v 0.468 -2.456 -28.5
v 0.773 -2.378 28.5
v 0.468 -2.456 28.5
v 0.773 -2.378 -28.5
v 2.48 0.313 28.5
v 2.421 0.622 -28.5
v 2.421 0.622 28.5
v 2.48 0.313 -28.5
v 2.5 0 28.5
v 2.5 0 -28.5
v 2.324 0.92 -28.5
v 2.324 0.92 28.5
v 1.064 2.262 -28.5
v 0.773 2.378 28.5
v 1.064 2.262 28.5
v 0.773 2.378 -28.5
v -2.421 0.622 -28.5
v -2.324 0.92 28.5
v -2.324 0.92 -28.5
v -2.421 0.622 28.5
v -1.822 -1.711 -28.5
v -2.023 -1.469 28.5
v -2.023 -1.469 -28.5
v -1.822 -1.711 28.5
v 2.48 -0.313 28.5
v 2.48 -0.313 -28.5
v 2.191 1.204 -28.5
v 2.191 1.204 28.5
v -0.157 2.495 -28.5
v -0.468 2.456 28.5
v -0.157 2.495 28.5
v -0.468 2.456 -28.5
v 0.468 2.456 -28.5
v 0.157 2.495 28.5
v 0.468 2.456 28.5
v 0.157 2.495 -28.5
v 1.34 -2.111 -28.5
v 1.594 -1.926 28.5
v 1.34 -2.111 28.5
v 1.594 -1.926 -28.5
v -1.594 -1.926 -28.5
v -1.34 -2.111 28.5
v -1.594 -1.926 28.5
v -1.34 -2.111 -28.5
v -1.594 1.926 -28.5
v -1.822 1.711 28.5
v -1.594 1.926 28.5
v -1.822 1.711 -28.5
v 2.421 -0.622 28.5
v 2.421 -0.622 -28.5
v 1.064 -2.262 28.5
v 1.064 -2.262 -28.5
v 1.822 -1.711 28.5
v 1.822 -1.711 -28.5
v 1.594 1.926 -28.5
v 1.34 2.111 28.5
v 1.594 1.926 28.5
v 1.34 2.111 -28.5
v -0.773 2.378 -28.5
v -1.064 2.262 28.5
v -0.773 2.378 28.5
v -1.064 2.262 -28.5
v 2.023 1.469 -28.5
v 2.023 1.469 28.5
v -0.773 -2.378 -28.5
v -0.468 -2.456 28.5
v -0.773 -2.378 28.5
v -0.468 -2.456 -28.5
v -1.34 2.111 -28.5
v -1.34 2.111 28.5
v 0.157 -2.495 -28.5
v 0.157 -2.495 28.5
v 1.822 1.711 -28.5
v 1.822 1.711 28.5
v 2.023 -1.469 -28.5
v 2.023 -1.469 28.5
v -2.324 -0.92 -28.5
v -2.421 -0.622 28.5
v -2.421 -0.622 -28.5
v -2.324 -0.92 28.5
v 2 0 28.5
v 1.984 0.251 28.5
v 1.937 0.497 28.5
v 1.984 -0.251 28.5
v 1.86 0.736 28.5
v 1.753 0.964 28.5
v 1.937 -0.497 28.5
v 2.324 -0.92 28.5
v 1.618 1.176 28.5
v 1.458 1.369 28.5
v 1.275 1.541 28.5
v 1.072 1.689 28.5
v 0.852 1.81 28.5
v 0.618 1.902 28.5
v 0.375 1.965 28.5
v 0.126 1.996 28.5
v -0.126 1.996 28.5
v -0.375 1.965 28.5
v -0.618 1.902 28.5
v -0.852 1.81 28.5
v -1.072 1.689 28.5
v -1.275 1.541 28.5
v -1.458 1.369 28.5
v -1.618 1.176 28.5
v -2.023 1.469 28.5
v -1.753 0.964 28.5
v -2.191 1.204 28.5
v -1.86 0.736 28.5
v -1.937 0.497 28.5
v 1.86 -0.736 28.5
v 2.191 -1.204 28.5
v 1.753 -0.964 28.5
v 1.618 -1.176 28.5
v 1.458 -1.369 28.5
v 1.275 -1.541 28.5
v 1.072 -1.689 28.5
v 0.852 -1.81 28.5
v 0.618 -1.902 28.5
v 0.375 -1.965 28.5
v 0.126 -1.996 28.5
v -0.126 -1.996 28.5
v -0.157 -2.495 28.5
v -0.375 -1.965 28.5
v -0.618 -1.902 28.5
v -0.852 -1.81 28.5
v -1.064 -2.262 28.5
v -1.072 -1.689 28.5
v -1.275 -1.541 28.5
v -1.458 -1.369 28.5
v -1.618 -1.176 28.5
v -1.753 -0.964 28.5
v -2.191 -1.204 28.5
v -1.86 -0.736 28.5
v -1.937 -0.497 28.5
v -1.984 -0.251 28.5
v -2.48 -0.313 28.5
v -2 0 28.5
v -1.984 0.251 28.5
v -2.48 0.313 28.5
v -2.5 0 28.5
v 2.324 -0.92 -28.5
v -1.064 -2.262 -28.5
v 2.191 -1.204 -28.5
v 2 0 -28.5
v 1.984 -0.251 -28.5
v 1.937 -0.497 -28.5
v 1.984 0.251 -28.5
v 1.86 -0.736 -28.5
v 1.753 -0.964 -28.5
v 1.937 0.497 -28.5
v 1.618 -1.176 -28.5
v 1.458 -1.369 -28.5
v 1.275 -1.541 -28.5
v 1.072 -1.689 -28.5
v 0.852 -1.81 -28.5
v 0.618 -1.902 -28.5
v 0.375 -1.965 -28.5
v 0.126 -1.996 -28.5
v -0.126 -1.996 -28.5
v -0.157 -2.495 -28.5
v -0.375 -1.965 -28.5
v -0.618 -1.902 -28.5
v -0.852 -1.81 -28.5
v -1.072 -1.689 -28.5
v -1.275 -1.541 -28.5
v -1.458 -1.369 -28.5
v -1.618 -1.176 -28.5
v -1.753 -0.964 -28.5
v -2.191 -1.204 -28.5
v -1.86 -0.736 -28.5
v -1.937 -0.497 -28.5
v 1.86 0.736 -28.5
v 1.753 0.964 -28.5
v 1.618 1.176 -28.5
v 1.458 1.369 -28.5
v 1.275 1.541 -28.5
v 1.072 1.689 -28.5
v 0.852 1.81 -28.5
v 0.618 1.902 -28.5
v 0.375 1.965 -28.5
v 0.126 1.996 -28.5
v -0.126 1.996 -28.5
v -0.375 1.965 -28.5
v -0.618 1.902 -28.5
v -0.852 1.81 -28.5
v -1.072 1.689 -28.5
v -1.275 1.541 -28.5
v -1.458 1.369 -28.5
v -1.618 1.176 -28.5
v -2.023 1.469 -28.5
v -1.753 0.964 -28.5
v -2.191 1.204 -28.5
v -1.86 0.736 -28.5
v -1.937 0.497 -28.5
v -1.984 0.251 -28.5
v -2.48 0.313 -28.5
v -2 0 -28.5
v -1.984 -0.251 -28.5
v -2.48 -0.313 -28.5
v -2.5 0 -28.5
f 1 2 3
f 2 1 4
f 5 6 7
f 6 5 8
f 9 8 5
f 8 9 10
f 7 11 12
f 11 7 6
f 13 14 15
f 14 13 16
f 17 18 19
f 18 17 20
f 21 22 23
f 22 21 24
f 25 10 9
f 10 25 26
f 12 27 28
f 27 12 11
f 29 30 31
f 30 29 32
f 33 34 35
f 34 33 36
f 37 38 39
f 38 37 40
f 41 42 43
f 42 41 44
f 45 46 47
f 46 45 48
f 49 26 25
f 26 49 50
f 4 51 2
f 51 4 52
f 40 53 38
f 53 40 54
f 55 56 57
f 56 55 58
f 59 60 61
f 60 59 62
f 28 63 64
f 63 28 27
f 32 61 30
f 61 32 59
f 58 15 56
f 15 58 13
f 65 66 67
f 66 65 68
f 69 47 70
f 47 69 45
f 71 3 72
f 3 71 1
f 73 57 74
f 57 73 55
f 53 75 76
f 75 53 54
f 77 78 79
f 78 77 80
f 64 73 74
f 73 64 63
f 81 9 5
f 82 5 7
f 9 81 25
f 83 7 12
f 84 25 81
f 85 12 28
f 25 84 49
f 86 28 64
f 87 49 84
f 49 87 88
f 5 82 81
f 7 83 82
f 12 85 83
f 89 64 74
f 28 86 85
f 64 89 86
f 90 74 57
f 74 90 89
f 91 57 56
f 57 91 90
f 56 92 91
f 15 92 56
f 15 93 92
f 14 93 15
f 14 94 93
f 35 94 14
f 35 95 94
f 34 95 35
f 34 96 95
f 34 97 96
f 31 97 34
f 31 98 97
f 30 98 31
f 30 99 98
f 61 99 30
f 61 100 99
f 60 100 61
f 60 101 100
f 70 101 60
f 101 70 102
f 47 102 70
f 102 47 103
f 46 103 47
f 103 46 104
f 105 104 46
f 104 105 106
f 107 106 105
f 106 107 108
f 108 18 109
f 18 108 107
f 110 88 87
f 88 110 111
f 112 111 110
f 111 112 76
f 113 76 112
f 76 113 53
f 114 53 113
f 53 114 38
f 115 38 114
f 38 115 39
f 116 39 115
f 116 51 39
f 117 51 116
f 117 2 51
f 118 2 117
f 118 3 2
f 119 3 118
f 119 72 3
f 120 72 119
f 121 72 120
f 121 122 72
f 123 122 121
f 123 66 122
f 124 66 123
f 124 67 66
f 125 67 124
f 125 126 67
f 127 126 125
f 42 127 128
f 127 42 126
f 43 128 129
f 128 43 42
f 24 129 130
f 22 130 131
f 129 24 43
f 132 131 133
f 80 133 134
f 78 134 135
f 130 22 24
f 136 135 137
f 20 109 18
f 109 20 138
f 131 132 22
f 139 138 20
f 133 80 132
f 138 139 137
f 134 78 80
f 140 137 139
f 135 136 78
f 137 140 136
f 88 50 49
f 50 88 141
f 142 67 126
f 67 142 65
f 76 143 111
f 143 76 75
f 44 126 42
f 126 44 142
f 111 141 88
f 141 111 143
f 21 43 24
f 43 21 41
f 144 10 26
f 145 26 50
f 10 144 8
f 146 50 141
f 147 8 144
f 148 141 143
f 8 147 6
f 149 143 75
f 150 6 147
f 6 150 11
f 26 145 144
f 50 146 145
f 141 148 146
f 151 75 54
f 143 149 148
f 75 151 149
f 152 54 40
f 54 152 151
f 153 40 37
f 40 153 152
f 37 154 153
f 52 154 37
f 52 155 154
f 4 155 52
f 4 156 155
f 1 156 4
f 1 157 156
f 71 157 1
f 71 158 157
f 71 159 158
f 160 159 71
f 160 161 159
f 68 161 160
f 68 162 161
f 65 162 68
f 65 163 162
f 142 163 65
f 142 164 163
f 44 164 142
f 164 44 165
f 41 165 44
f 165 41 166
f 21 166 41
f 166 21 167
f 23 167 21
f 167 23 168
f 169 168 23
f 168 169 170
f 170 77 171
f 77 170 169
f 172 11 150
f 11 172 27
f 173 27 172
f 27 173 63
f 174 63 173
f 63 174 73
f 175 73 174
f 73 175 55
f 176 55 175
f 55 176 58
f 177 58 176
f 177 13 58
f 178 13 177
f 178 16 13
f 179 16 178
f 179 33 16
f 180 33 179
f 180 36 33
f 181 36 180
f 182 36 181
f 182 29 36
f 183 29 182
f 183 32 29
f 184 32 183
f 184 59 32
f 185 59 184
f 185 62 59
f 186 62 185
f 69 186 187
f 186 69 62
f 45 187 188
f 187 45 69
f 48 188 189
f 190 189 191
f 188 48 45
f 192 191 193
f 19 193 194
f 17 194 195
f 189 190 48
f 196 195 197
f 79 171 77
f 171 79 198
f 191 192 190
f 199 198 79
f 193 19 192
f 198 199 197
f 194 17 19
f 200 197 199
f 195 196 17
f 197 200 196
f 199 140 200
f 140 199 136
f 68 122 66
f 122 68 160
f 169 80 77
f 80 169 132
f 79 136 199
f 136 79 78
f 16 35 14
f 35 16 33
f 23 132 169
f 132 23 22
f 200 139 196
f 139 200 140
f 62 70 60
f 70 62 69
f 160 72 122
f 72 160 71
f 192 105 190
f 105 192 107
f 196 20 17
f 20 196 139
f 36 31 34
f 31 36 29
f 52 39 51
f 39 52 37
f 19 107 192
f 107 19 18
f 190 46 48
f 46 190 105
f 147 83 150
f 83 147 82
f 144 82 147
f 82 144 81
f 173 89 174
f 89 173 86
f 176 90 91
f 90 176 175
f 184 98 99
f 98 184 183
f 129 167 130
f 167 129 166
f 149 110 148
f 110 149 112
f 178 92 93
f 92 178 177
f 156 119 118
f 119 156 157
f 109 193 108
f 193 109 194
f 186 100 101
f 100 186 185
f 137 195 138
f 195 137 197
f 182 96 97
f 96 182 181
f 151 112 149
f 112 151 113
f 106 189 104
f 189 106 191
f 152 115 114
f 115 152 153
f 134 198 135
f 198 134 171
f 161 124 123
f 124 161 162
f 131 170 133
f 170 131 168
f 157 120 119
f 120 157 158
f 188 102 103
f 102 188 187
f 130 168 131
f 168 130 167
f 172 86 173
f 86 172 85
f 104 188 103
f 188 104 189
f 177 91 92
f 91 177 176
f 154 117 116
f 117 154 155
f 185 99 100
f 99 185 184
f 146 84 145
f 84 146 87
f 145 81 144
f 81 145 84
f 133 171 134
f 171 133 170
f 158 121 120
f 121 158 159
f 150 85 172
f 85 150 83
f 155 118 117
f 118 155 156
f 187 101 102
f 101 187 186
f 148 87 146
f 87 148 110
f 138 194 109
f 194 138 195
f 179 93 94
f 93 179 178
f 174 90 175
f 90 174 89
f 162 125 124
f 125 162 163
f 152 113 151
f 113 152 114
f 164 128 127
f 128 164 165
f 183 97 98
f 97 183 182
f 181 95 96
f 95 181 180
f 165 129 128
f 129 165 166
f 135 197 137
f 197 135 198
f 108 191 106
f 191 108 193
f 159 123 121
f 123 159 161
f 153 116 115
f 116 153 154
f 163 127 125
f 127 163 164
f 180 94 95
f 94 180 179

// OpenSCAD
$fn = 50;


difference() {
	union() {
		translate(v = [0, 0, -28.5000000000]) {
			cylinder(h = 57, r = 2.5000000000);
		}
	}
	union() {
		translate(v = [0, 0, -100.0000000000]) {
			cylinder(h = 200, r = 2.0000000000);
		}
	}
}
